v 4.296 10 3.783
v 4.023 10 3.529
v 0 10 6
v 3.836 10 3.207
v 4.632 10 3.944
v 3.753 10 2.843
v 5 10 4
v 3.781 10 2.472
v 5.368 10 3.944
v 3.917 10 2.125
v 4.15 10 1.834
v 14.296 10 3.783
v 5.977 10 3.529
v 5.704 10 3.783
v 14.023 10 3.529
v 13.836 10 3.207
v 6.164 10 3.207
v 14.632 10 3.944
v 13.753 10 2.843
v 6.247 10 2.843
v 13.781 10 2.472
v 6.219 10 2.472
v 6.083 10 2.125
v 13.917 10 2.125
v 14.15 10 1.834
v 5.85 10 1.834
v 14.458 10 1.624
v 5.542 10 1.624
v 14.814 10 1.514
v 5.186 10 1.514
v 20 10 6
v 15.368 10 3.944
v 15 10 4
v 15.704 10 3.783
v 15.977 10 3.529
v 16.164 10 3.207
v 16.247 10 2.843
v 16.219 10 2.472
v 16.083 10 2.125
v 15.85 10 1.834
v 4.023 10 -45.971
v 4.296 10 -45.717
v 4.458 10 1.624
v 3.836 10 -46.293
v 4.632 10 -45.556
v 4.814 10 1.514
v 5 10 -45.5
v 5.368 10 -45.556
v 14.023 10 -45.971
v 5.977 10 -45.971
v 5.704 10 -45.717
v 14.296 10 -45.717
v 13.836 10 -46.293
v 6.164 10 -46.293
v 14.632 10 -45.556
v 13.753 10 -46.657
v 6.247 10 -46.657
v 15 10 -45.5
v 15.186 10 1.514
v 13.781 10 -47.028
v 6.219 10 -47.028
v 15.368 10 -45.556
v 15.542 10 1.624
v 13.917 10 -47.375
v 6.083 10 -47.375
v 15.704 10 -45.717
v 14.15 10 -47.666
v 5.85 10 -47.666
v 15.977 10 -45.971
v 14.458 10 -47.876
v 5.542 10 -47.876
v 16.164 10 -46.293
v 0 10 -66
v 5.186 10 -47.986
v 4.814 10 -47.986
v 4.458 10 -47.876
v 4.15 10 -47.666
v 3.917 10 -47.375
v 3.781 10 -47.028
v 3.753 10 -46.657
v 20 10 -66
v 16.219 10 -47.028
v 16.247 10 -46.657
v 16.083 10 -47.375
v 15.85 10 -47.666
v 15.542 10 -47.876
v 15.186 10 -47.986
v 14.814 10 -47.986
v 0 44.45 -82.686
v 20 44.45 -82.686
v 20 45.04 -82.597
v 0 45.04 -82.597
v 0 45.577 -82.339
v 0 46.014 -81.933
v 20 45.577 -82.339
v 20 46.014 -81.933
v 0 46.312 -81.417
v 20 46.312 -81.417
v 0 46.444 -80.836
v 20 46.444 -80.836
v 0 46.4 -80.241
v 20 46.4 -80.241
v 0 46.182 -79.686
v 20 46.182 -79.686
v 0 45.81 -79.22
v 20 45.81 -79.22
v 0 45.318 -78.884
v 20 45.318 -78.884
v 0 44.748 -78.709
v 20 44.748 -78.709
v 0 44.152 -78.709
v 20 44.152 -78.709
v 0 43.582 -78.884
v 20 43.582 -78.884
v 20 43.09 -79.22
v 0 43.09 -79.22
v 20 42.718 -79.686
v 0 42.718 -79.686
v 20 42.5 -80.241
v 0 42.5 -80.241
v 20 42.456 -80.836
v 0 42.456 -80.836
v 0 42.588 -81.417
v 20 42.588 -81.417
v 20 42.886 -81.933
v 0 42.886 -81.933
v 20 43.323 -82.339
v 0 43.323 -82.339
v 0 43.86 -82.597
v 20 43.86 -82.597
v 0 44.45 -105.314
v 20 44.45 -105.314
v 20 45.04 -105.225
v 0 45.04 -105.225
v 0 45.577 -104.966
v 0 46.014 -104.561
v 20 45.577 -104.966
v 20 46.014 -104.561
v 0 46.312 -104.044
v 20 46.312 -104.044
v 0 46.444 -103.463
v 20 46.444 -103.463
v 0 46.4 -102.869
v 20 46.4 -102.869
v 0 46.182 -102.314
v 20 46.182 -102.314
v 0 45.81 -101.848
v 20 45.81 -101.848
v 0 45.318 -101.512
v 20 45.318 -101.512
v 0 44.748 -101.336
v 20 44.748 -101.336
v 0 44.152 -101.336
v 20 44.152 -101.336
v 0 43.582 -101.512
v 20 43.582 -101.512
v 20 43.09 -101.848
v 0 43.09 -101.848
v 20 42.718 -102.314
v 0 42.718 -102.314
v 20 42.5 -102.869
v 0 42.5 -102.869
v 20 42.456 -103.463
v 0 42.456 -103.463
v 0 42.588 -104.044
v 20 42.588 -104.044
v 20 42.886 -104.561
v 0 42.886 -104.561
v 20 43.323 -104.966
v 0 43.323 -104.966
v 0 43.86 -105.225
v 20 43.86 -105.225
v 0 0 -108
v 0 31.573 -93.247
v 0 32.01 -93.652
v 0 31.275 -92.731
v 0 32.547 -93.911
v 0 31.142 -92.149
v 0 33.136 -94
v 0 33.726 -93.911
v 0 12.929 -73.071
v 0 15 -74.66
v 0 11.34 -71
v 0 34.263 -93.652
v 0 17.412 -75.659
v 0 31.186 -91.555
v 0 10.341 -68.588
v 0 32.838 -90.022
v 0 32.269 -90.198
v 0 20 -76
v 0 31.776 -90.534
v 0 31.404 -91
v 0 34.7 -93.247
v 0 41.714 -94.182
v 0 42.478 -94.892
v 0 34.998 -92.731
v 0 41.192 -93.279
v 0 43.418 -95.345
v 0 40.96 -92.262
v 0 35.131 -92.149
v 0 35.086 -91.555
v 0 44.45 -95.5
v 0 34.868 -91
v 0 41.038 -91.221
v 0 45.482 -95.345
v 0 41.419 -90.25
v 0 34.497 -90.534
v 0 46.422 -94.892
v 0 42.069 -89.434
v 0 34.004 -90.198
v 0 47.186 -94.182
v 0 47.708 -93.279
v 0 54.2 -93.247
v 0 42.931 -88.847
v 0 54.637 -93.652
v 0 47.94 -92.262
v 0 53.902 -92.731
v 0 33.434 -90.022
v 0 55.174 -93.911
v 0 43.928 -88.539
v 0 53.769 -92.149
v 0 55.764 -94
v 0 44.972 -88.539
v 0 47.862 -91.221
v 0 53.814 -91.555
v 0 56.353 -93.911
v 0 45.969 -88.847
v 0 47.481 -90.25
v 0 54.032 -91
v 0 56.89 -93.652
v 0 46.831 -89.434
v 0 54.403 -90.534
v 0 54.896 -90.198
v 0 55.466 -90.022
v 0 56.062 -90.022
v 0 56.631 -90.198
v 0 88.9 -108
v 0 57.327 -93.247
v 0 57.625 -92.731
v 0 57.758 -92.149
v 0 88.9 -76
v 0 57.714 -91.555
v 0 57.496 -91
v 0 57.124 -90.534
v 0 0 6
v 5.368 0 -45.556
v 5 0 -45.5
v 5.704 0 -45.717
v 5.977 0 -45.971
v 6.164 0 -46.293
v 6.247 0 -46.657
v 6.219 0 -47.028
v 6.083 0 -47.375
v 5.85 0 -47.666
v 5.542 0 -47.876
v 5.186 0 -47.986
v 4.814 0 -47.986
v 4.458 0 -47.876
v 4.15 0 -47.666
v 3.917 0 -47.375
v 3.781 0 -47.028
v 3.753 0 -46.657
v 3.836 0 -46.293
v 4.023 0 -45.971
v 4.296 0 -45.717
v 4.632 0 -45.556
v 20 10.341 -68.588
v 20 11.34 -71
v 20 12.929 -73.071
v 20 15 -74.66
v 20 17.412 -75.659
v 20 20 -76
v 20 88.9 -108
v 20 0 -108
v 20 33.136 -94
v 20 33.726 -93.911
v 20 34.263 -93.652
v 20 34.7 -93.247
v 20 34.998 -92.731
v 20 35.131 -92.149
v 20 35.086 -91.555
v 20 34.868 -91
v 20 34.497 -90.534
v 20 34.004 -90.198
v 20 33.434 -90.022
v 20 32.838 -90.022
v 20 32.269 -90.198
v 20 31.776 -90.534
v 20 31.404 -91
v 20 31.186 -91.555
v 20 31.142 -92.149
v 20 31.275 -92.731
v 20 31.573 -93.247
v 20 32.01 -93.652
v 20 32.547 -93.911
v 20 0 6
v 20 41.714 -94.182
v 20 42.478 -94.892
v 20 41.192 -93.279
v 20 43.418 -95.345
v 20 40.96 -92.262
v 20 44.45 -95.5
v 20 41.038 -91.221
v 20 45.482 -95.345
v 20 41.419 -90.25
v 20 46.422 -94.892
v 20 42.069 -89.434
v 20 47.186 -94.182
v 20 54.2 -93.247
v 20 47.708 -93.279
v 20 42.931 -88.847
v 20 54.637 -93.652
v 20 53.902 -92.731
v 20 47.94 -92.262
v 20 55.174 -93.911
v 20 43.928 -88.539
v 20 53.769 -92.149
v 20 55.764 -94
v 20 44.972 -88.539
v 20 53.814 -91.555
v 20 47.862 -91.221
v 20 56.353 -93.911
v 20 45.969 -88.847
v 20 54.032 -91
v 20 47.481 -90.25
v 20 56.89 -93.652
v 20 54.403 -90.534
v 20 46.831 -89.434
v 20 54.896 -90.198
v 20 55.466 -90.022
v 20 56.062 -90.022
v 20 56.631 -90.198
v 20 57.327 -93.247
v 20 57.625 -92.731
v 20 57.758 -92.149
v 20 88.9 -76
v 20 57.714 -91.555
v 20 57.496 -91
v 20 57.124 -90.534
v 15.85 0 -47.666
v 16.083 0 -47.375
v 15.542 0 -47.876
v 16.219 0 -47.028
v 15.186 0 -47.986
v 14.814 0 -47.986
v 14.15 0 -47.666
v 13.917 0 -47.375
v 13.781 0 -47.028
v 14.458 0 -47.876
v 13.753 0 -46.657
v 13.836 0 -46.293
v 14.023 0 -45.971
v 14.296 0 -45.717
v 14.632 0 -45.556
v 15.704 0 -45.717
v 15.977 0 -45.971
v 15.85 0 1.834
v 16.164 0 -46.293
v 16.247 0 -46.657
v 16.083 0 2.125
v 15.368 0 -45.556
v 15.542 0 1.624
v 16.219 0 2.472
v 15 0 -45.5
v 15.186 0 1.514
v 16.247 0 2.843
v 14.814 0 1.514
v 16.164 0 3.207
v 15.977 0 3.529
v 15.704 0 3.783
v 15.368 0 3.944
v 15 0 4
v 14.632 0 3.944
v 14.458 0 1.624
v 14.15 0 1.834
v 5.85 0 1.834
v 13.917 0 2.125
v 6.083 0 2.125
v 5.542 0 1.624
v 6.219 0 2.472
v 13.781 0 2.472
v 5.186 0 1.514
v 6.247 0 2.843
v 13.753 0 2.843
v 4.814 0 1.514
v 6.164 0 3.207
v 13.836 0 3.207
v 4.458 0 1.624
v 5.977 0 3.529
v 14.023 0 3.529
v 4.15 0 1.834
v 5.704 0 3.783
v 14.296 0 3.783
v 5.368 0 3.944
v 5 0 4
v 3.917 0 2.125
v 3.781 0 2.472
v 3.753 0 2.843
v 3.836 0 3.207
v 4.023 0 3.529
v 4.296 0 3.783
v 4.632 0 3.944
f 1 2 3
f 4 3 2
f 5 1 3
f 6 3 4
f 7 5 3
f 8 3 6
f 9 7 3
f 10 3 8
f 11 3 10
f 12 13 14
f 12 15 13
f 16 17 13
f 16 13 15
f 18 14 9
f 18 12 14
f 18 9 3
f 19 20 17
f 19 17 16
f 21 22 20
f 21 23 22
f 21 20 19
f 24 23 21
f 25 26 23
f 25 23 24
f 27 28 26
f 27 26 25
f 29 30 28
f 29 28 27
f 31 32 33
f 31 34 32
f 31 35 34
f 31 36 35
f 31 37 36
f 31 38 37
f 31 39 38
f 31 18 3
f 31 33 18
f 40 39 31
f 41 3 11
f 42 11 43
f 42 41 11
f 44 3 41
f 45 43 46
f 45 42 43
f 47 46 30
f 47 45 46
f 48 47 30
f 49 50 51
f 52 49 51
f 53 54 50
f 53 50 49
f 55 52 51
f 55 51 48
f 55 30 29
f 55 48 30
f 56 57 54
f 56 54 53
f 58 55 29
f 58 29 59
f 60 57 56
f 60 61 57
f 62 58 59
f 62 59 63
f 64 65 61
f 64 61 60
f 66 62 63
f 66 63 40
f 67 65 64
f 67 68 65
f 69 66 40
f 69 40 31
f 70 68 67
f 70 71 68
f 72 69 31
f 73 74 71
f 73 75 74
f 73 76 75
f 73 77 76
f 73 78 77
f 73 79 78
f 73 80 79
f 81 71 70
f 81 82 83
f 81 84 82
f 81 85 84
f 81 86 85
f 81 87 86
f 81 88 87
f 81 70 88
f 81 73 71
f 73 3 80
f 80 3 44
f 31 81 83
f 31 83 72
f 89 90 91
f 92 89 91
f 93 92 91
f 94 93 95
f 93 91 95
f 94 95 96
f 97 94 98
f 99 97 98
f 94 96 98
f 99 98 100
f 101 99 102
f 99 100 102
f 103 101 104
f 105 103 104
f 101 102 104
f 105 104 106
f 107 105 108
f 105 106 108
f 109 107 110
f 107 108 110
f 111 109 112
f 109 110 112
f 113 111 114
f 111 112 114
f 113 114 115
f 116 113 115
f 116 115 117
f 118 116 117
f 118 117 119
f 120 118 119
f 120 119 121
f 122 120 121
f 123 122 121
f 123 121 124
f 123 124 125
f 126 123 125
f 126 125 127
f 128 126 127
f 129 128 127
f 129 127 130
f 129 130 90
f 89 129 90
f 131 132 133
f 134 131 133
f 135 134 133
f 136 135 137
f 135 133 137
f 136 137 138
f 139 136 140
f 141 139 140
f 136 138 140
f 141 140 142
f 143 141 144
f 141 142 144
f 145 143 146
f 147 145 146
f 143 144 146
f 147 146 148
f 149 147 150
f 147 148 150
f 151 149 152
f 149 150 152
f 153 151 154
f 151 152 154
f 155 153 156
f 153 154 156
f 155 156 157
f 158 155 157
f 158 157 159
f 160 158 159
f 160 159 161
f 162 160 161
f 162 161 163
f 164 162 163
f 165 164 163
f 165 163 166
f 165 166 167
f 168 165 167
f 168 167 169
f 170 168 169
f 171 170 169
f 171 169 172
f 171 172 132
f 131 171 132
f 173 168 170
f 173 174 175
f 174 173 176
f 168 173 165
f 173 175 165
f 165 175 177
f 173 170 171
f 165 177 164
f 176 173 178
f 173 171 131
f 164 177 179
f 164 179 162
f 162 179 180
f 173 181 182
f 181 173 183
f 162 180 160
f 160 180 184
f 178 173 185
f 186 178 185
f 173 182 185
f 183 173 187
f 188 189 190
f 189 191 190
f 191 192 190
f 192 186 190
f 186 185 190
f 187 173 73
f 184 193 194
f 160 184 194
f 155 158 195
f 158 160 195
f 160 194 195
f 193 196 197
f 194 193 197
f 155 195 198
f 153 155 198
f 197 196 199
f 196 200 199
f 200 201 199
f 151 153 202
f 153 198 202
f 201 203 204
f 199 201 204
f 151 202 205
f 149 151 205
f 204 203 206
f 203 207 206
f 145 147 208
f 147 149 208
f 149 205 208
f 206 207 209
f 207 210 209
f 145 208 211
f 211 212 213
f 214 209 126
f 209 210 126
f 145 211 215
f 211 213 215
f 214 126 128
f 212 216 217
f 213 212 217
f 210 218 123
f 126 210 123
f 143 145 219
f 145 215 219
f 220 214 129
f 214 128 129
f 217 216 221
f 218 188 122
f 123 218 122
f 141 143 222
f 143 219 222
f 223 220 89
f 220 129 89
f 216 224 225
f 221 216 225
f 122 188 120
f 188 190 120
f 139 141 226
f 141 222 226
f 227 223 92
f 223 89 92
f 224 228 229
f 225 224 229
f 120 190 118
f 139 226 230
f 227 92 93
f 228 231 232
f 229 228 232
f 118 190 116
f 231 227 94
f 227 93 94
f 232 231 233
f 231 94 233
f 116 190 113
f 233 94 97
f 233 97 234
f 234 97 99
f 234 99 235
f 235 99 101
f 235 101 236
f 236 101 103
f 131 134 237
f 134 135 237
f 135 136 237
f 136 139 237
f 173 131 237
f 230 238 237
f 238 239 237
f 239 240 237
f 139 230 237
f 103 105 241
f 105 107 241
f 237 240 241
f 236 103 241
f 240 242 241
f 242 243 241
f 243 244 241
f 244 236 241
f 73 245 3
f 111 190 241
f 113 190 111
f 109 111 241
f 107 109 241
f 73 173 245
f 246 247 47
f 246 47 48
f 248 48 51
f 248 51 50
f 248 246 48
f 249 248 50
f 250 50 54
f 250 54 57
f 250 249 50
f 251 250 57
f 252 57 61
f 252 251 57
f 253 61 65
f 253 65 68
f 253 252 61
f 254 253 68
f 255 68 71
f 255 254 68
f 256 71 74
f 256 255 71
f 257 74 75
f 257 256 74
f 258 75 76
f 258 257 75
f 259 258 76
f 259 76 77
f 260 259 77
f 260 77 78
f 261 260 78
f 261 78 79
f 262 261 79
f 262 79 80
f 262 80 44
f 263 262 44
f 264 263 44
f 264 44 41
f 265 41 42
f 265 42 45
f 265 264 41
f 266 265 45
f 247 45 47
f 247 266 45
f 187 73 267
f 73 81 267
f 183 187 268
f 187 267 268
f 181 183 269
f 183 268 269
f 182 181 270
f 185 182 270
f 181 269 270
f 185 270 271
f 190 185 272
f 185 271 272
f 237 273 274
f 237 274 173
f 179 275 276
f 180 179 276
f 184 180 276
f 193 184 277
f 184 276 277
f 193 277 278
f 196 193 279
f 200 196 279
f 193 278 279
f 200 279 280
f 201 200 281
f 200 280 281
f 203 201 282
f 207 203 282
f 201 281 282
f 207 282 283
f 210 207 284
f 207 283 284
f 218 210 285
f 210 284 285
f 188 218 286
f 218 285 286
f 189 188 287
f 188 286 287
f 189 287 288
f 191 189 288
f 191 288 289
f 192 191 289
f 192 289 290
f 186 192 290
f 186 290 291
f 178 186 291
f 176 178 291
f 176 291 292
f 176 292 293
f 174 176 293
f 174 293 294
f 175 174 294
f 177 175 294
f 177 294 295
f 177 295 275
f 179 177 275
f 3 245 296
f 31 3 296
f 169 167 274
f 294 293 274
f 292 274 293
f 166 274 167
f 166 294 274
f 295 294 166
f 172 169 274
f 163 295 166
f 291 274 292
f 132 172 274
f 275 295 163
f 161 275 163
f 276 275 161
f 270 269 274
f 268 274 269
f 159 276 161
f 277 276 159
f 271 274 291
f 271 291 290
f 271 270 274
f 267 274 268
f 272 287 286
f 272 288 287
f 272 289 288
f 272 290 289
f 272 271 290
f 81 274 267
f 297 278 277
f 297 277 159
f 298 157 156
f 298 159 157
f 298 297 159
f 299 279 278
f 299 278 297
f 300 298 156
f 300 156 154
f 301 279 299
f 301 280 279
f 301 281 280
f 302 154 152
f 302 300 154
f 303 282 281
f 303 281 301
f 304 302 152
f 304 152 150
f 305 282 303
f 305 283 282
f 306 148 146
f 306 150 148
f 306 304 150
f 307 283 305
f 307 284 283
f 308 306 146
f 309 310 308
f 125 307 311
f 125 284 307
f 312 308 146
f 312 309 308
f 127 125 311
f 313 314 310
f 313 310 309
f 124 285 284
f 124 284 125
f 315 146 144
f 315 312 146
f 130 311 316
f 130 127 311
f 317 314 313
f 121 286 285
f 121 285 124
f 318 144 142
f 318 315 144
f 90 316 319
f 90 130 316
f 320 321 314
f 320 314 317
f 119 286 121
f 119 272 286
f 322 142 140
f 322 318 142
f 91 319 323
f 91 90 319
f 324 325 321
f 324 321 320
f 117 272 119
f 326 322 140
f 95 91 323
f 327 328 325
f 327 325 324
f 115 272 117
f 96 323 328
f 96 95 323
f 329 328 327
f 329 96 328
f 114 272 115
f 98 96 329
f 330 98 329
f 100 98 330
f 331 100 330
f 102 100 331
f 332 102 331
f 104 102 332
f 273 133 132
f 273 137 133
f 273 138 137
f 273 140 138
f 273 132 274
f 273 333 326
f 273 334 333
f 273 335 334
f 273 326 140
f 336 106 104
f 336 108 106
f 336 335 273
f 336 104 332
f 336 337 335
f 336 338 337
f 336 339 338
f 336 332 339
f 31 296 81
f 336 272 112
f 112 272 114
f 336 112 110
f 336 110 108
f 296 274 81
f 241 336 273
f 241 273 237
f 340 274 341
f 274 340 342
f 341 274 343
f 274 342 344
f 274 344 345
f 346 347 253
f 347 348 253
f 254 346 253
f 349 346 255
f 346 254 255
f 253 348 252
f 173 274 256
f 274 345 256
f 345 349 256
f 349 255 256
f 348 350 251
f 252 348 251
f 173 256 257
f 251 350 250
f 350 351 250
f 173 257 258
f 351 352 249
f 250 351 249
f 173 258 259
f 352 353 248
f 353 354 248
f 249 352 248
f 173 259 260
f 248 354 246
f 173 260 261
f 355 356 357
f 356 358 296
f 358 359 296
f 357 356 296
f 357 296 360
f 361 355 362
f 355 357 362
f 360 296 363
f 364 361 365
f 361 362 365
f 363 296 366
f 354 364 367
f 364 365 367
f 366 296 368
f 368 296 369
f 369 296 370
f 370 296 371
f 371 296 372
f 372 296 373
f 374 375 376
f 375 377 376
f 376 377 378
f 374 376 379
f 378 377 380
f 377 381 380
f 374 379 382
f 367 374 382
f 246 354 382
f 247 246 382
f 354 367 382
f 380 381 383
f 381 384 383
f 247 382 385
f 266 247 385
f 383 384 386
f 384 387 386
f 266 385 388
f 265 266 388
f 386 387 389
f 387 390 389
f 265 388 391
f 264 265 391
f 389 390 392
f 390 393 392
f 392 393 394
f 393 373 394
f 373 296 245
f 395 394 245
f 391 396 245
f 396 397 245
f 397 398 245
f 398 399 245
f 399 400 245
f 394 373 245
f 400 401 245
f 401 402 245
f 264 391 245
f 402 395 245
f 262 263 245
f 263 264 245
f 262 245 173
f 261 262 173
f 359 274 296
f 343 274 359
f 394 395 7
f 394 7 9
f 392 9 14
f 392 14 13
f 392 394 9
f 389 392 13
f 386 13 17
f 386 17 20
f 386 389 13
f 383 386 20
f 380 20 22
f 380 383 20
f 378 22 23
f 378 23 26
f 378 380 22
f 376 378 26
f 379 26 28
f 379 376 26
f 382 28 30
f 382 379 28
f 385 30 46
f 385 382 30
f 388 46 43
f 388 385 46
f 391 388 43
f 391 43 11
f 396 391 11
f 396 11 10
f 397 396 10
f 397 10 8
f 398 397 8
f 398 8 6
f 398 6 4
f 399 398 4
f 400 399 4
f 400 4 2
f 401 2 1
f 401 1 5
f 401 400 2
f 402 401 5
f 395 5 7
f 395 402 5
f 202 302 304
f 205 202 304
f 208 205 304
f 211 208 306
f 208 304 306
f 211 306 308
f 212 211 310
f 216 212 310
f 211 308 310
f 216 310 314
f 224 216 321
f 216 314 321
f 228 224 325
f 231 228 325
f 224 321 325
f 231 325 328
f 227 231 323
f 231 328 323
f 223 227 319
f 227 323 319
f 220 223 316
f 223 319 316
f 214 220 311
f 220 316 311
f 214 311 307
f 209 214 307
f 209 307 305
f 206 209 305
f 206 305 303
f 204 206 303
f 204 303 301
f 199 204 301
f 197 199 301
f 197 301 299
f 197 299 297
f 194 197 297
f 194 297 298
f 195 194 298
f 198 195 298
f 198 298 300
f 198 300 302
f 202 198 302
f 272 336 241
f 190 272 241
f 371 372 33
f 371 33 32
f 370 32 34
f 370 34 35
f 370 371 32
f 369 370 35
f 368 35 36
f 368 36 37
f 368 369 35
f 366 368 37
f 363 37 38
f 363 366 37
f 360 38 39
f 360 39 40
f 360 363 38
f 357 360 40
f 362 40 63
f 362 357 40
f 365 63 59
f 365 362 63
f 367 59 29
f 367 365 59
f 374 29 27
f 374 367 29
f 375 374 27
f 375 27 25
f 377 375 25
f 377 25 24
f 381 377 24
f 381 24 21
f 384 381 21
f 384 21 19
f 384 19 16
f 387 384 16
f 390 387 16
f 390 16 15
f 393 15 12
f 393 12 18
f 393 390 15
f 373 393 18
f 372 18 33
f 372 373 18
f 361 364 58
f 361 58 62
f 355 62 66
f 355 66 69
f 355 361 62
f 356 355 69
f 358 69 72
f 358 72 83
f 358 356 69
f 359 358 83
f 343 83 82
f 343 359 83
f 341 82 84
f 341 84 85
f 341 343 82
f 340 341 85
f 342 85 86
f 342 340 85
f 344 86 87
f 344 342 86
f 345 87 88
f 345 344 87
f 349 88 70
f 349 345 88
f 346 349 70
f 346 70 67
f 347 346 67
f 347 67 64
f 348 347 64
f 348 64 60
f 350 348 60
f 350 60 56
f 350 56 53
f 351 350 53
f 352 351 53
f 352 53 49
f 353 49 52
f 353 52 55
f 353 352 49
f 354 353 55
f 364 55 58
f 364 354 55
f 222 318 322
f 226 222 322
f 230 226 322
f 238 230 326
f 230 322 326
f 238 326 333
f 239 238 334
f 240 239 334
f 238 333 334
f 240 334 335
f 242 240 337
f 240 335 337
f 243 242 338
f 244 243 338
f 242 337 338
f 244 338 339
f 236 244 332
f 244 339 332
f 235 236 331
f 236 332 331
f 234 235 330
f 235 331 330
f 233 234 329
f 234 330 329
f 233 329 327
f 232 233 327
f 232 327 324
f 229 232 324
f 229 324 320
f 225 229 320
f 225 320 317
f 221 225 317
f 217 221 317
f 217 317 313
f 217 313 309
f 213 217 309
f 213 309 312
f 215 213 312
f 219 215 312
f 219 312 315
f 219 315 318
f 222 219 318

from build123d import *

# Parameters (mm, degrees)
SKETCH1_W           = 20
SKETCH1_H           = 82
SKETCH1_R           = 1.25
BOSS_EXTRUDE1_DEPTH = 10
SKETCH2_W           = 20
SKETCH2_H           = 88.9
BOSS_EXTRUDE2_DEPTH = 32
FILLET1_R           = 10
SKETCH3_R           = 2
SKETCH3_R_2         = 3.5
CUT_EXTRUDE1_DEPTH  = 32


with BuildPart() as part:
    # Sketch1 → Boss-Extrude1 (new body)
    with BuildSketch(Plane(origin=(0, 0, 0), x_dir=(1, 0, 0), z_dir=(0, 1, 0))):
        with Locations((10, 35)):
            Rectangle(SKETCH1_W, SKETCH1_H)
        with Locations(Location((5, 46.75, 0), (0, 0, 270))):
            Circle(SKETCH1_R, mode=Mode.SUBTRACT)
        with Locations(Location((15, 46.75, 0), (0, 0, 270))):
            Circle(SKETCH1_R, mode=Mode.SUBTRACT)
        with Locations(Location((5, -2.75, 0), (0, 0, 270))):
            Circle(SKETCH1_R, mode=Mode.SUBTRACT)
        with Locations(Location((15, -2.75, 0), (0, 0, 270))):
            Circle(SKETCH1_R, mode=Mode.SUBTRACT)
    extrude(amount=BOSS_EXTRUDE1_DEPTH)

    # Sketch2 → Boss-Extrude2 (add)
    with BuildSketch(Plane(origin=(0, 0, -76), x_dir=(-1, 0, 0), z_dir=(0, 0, -1))):
        with Locations((-10, 44.45)):
            Rectangle(SKETCH2_W, SKETCH2_H)
    extrude(amount=BOSS_EXTRUDE2_DEPTH)

    # Fillet1
    fillet1_edges = [part.edges().sort_by_distance(p)[0] for p in [
        (10, 10, -76),
    ]]
    fillet(fillet1_edges, radius=FILLET1_R)

    # Sketch3 → Cut-Extrude1 (cut)
    with BuildSketch(Plane(origin=(20, 0, 0), x_dir=(0, 0, -1), z_dir=(1, 0, 0))):
        with Locations((92, 33.136291501)):
            Circle(SKETCH3_R)
        with Locations((103.313708499, 44.45)):
            Circle(SKETCH3_R)
        with Locations((80.686291501, 44.45)):
            Circle(SKETCH3_R)
        with Locations((92, 55.763708499)):
            Circle(SKETCH3_R)
        with Locations((92, 44.45)):
            Circle(SKETCH3_R_2)
    extrude(amount=-CUT_EXTRUDE1_DEPTH, mode=Mode.SUBTRACT)


solid = part.part
